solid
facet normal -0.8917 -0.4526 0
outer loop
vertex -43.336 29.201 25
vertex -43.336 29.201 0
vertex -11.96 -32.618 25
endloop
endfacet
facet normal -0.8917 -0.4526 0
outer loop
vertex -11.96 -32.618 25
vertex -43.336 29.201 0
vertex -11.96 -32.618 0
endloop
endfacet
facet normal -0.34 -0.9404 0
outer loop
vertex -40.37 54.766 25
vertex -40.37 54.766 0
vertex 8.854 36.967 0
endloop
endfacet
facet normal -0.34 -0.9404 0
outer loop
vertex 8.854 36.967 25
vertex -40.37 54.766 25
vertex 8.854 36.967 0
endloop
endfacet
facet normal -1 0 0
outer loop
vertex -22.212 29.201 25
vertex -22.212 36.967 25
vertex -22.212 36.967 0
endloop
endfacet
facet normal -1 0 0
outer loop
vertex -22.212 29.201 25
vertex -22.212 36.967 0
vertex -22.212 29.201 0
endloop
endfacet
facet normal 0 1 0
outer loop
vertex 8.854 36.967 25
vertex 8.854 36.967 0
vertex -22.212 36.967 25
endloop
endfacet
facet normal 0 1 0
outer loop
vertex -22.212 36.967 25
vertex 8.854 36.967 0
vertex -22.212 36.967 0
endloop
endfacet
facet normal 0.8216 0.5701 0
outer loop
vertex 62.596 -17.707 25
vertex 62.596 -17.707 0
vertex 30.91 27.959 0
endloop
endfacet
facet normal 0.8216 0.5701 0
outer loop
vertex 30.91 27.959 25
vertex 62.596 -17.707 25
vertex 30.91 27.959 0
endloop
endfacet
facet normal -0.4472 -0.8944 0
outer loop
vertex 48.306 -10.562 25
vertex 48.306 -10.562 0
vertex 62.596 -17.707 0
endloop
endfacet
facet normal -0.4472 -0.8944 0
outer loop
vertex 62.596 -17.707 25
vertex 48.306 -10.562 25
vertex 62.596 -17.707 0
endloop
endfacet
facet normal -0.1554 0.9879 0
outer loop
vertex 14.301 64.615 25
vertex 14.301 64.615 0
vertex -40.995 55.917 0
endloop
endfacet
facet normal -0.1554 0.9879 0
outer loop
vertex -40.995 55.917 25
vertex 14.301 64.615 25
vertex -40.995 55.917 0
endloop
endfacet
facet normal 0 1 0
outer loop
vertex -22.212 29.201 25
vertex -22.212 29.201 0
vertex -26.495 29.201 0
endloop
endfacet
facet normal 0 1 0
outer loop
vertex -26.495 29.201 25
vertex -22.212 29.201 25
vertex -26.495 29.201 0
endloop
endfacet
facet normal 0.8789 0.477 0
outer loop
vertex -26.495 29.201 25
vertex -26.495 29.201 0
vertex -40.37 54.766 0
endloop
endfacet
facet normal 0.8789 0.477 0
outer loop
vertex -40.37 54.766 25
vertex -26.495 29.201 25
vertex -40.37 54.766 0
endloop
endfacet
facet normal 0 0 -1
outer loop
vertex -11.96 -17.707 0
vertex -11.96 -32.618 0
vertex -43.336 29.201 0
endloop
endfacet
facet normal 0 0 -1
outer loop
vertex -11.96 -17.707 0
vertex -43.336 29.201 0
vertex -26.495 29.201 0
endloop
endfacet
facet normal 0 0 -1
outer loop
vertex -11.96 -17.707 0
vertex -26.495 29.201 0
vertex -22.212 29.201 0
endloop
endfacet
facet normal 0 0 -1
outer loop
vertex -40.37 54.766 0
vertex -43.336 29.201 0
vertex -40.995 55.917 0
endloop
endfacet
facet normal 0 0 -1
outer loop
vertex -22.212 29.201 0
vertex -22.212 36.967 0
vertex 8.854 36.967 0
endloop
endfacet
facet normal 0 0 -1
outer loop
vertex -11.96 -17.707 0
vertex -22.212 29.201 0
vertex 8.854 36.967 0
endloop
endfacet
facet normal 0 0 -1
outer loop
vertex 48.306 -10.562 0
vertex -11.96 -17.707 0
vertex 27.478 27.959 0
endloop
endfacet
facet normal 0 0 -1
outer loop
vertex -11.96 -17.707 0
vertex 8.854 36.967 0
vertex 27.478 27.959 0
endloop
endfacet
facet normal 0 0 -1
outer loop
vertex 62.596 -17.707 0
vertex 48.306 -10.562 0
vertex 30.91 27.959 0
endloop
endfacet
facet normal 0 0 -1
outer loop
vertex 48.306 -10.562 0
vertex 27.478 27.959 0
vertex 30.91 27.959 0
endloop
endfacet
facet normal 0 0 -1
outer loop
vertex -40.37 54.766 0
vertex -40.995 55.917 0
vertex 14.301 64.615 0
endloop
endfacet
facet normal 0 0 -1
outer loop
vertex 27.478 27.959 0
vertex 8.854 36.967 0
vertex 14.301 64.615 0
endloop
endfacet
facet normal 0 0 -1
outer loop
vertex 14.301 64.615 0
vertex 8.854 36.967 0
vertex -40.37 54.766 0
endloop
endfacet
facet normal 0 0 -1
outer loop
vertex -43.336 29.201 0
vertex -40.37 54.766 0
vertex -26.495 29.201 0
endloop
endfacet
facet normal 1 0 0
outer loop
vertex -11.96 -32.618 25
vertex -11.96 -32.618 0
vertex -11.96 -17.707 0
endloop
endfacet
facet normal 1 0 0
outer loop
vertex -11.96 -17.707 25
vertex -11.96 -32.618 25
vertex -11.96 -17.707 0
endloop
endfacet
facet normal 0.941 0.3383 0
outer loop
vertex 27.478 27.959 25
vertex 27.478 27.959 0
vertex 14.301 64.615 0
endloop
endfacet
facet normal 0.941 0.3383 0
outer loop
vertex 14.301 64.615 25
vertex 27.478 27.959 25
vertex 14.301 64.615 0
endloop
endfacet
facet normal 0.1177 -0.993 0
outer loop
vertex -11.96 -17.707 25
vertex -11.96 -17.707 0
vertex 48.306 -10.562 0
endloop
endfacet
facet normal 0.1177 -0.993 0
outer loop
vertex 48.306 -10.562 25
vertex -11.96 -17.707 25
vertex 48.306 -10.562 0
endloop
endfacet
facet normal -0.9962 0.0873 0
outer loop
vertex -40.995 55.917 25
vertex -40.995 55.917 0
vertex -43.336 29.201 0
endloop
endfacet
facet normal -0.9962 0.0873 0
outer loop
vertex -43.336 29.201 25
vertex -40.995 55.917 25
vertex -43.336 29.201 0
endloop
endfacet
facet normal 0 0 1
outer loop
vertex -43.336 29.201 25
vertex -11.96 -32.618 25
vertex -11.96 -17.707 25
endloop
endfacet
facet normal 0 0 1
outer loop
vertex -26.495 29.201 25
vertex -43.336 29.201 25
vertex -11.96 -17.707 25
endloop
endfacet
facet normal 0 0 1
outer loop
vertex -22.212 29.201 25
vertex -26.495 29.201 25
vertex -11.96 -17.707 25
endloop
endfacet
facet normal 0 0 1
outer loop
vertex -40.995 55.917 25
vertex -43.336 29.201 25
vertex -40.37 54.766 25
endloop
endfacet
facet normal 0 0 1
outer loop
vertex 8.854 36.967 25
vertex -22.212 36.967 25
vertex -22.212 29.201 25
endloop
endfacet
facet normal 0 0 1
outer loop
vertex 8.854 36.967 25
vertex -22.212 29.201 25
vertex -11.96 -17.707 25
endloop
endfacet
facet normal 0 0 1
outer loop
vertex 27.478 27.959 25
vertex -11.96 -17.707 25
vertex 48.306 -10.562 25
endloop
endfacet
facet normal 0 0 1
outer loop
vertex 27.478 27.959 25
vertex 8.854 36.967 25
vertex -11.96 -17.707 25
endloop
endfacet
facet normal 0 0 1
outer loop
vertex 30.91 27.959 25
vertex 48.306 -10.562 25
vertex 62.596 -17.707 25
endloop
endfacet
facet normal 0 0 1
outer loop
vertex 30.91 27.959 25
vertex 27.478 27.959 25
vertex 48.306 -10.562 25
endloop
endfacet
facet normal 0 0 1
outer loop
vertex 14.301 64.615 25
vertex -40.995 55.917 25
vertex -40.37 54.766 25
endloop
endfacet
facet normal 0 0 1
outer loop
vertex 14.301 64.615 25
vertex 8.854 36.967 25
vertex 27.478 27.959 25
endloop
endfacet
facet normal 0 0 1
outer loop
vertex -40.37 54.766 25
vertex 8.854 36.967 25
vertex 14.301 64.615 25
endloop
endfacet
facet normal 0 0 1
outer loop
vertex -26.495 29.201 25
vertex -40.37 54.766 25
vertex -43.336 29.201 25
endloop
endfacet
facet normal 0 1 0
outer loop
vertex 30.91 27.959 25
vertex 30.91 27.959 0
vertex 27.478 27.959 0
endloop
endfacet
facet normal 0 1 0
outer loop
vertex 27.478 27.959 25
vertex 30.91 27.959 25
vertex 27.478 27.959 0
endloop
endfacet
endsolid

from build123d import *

# Parameters (mm, degrees)
F1_DEPTH = 25


with BuildPart() as f1:
    # F0 (on Top) → F1 (new body)
    with BuildSketch(Plane.XY):
        Polygon((-40.994822979, 55.9171624482), (-43.3357991278, 29.2011853307), (-26.4946625571, 29.2011853307), (-40.3697645688, 54.765516832), align=None)
        Polygon((-26.4946625571, 29.2011853307), (-43.3357991278, 29.2011853307), (-11.9600594044, -32.6183438301), (-11.9600594044, -17.7071020007), (-15.0134380226, 8.0474792324), align=None)
        Polygon((-22.2115386277, 29.2011853307), (-26.4946625571, 29.2011853307), (-15.0134380226, 8.0474792324), (31.386833638, 17.0857999474), (27.4783183213, 27.9585812241), (8.8535510004, 27.9585812241), (8.8535510004, 36.9674563408), (-22.2115386277, 36.9674563408), align=None)
        Polygon((14.3010364845, 64.6153911948), (-40.994822979, 55.9171624482), (-40.3697645688, 54.765516832), (8.8535510004, 36.9674563408), align=None)
        Polygon((31.386833638, 17.0857999474), (-15.0134380226, 8.0474792324), (-11.9600594044, -17.7071020007), (48.3062155545, -10.56213025), align=None)
        Polygon((27.4783183213, 27.9585812241), (14.3010364845, 64.6153911948), (8.8535510004, 36.9674563408), (8.8535510004, 27.9585812241), align=None)
        Polygon((27.4783183213, 27.9585812241), (31.386833638, 17.0857999474), (48.3062155545, -10.56213025), (62.5961571932, -17.7071020007), (30.9097617865, 27.9585812241), align=None)
    extrude(amount=F1_DEPTH)


solid = f1.part
